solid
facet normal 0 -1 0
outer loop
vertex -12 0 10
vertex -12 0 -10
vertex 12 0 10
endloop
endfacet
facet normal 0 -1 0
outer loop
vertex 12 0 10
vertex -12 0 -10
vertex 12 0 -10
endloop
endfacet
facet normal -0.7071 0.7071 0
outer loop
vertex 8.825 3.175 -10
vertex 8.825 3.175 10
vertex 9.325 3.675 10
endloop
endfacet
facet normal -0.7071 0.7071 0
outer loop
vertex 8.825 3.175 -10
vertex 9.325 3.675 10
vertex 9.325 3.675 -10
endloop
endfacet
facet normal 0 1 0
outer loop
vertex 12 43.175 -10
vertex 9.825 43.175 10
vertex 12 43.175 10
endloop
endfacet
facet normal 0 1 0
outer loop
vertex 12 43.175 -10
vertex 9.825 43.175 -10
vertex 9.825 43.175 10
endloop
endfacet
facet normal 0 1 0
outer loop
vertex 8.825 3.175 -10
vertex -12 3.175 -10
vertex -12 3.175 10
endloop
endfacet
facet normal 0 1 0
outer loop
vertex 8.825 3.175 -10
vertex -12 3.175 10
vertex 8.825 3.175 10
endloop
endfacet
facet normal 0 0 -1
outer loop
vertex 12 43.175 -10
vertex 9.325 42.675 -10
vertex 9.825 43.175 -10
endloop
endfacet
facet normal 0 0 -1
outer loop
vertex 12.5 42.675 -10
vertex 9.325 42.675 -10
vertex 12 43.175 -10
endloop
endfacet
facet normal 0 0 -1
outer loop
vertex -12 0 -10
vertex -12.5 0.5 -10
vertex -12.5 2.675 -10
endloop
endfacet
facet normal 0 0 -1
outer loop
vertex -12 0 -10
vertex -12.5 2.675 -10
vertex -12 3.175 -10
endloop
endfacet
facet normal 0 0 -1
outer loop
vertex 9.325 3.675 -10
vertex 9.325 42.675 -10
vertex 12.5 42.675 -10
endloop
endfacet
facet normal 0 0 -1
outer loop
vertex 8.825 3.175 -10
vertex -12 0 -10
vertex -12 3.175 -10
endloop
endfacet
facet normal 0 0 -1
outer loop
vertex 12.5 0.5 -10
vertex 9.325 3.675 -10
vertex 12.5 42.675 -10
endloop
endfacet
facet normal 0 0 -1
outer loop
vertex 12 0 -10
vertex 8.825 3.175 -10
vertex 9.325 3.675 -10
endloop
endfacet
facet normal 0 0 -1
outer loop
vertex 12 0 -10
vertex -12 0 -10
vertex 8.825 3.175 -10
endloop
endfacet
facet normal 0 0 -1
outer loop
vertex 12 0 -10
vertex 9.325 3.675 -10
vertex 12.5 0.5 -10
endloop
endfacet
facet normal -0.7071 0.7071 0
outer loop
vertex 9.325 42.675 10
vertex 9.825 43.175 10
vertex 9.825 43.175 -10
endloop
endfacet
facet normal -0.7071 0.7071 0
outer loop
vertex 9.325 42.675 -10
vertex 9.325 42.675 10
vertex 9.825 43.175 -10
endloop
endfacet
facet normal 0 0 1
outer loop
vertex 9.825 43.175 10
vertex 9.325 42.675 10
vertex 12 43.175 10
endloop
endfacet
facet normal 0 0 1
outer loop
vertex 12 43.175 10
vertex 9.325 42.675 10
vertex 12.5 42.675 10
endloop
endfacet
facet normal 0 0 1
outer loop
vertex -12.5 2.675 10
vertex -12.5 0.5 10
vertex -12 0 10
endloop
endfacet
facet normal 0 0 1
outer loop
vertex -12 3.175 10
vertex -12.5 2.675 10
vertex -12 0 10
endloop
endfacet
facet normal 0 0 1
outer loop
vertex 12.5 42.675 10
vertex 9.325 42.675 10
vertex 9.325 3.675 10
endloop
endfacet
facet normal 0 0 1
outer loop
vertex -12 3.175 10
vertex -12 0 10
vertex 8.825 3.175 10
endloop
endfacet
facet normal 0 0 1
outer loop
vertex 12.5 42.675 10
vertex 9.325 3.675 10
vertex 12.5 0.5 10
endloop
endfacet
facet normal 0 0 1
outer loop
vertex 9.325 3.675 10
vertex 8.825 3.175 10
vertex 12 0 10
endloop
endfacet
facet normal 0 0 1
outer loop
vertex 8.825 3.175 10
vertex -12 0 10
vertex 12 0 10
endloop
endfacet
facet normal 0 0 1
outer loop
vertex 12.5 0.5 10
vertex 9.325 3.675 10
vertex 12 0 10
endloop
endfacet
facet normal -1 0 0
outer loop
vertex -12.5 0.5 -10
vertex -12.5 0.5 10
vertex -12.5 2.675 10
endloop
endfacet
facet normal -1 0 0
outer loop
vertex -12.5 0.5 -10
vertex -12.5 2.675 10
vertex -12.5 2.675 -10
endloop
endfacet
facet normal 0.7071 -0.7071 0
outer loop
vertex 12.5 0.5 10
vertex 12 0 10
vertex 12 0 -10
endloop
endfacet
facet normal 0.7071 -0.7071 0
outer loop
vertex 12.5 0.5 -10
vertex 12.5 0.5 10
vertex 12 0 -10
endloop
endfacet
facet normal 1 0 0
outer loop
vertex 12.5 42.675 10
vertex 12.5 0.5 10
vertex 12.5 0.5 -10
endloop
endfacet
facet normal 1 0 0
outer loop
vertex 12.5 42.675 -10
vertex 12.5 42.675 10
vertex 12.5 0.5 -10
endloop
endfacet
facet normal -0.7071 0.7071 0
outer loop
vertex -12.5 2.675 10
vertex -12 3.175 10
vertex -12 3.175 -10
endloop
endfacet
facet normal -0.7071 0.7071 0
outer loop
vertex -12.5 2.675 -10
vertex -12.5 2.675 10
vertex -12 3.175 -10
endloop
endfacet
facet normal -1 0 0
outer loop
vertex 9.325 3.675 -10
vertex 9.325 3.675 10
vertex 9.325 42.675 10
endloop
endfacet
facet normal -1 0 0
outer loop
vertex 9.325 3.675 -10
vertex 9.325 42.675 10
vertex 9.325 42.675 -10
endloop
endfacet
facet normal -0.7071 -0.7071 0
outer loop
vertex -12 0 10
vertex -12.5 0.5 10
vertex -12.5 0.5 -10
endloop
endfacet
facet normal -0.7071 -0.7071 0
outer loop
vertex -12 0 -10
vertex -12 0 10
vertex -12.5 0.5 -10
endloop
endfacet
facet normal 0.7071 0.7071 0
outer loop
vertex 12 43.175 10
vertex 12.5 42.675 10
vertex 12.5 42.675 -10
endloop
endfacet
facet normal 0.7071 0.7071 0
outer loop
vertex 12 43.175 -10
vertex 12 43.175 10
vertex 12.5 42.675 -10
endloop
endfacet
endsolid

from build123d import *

# Parameters (mm, degrees)
SKETCH1_W           = 25
SKETCH1_H           = 20
BOSS_EXTRUDE1_DEPTH = 3.175
SKETCH3_W           = 3.175
SKETCH3_H           = 20
BOSS_EXTRUDE2_DEPTH = 40
CHAMFER1_SIZE       = 0.5


with BuildPart() as part:
    # Sketch1 → Boss-Extrude1 (new body)
    with BuildSketch(Plane(origin=(0, 0, 0), x_dir=(1, 0, 0), z_dir=(0, 1, 0))):
        Rectangle(SKETCH1_W, SKETCH1_H)
    extrude(amount=BOSS_EXTRUDE1_DEPTH)

    # Sketch3 → Boss-Extrude2 (add)
    with BuildSketch(Plane(origin=(0, 3.175, 0), x_dir=(1, 0, 0), z_dir=(0, 1, 0))):
        with Locations((10.9125, 0)):
            Rectangle(SKETCH3_W, SKETCH3_H)
    extrude(amount=BOSS_EXTRUDE2_DEPTH)

    # Chamfer1
    chamfer1_edges = [part.edges().sort_by_distance(p)[0] for p in [
        (-12.5, 3.175, 0),
        (9.325, 3.175, 0),
        (12.5, 43.175, 0),
        (9.325, 43.175, 0),
        (-12.5, 0, 0),
        (12.5, 0, 0),
    ]]
    chamfer(chamfer1_edges, length=CHAMFER1_SIZE)


solid = part.part
